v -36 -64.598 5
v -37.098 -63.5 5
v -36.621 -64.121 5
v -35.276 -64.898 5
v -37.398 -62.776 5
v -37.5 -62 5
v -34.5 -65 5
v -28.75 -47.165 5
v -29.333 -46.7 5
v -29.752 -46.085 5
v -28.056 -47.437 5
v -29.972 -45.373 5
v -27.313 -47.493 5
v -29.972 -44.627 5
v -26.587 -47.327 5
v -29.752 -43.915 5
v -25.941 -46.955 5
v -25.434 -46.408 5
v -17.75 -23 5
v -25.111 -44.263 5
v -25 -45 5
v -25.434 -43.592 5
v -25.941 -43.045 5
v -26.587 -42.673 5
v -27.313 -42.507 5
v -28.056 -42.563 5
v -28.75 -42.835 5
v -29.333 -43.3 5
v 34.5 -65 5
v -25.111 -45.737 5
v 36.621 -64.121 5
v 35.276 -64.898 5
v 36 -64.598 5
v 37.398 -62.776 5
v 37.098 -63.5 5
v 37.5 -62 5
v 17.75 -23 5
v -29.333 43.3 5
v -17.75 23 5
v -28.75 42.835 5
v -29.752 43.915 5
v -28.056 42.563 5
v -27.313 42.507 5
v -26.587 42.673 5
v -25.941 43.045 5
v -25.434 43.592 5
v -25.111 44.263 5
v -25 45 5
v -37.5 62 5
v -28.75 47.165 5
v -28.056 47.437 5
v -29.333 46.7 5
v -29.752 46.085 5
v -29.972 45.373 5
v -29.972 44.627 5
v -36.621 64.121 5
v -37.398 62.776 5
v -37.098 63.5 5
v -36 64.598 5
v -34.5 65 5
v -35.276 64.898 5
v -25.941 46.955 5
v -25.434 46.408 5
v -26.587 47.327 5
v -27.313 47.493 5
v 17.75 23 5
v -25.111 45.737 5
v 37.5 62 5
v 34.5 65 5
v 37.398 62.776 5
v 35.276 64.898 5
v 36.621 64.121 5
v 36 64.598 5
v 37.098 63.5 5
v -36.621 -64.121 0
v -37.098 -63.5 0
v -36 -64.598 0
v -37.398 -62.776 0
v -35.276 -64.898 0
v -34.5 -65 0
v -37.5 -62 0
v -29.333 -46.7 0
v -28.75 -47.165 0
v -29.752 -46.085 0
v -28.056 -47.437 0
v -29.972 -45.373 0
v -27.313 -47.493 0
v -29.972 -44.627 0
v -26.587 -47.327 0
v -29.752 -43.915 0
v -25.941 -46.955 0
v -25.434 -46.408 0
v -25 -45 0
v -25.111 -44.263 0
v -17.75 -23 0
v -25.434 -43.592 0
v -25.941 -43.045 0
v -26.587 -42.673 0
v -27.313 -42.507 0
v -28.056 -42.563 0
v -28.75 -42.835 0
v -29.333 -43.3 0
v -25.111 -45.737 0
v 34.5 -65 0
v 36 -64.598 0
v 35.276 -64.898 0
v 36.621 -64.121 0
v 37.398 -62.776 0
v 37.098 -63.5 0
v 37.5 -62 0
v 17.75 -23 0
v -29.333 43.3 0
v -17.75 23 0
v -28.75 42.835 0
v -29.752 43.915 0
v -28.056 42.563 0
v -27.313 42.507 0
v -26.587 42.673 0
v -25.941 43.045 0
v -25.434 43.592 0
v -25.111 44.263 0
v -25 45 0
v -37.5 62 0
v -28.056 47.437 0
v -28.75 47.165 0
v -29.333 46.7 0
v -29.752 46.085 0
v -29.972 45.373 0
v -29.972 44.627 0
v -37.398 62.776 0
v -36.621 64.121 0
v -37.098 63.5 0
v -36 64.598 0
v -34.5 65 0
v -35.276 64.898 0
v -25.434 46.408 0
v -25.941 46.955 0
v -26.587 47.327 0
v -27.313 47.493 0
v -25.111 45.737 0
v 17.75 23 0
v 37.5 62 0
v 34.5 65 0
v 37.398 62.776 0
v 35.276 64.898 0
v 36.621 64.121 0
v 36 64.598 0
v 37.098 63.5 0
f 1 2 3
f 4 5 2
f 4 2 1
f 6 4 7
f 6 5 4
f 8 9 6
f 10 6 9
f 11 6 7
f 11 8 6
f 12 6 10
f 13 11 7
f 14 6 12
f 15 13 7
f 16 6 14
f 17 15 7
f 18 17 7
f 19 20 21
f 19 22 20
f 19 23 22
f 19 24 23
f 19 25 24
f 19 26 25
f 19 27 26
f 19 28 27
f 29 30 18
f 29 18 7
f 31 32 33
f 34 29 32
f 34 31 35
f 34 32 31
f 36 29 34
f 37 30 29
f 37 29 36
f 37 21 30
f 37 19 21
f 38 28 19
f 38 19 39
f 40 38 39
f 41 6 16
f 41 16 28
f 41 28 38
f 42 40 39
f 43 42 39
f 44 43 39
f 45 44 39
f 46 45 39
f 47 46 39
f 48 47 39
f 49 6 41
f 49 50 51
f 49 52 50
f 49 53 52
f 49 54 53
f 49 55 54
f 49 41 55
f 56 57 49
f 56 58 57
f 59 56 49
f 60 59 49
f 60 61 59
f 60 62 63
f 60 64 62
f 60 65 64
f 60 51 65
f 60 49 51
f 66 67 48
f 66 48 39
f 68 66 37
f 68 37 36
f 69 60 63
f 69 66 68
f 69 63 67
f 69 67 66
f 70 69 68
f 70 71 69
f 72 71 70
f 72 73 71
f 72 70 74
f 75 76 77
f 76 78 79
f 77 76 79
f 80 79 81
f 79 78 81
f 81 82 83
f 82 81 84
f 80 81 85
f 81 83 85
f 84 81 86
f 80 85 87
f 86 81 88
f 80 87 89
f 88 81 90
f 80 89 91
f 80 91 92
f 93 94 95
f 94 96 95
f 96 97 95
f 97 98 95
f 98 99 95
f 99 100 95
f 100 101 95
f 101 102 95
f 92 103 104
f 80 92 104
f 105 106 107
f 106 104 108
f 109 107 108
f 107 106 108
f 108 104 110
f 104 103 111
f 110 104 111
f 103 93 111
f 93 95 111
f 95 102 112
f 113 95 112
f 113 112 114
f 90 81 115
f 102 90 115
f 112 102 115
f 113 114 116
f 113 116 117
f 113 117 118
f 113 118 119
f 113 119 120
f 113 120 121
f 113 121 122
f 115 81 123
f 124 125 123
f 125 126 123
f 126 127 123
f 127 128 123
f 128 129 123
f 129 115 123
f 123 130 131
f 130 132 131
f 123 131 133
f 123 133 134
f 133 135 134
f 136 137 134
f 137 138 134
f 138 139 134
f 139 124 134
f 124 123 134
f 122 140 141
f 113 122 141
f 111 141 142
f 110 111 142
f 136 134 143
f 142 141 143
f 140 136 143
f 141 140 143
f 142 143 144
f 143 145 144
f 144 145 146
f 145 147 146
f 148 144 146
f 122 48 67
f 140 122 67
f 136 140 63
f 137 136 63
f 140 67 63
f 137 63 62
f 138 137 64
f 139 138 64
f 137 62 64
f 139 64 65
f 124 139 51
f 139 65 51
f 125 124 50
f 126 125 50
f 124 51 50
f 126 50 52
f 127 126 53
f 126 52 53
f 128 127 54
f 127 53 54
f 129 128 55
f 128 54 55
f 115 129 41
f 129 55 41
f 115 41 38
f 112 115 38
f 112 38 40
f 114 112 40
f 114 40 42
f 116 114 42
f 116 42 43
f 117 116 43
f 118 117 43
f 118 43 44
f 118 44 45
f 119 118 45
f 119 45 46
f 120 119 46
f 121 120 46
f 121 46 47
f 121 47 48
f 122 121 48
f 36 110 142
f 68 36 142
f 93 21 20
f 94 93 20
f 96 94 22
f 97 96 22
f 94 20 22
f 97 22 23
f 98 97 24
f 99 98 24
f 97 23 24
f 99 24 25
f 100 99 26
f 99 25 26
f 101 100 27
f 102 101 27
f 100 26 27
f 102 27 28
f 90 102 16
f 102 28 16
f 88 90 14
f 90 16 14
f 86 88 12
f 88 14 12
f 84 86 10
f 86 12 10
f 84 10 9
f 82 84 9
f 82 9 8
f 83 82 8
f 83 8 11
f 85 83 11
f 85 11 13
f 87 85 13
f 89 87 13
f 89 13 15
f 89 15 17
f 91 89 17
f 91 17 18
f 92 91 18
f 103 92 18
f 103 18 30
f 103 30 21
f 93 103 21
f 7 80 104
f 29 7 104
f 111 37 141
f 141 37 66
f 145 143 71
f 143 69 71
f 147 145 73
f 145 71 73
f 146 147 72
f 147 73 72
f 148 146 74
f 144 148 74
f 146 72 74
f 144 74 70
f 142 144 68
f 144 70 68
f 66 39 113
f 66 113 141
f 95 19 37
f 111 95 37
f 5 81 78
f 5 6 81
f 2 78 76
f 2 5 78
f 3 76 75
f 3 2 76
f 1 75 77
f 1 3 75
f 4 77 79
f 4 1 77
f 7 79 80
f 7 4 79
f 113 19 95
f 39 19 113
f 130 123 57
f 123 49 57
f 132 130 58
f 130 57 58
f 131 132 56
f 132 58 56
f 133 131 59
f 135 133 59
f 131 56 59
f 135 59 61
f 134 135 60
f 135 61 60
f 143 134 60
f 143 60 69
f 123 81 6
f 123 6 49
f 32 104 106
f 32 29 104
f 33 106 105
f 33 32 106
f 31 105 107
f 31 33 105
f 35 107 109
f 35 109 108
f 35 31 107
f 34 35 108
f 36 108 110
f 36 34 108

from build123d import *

# Parameters (mm, degrees)
SKETCH_1_W          = 75
SKETCH_1_H          = 130
EXTRUDE_1_DEPTH     = 5
SKETCH_2_W          = 35.5
SKETCH_2_H          = 46
SKETCH_2_R          = 2.5
CUT_EXTRUDE_1_DEPTH = 10
FILLET_1_R          = 3


with BuildPart() as part:
    # 草图1 → 凸台-拉伸1 (new body)
    with BuildSketch(Plane.XY):
        Rectangle(SKETCH_1_W, SKETCH_1_H)
    extrude(amount=EXTRUDE_1_DEPTH)

    # 草图2 → 切除-拉伸1 (cut)
    with BuildSketch(Plane.XY.offset(5)):
        Rectangle(SKETCH_2_W, SKETCH_2_H)
        with Locations((-27.5, -45)):
            Circle(SKETCH_2_R)
        with Locations((-27.5, 45)):
            Circle(SKETCH_2_R)
    extrude(amount=-CUT_EXTRUDE_1_DEPTH, mode=Mode.SUBTRACT)

    # 圆角1
    fillet_1_edges = [part.edges().sort_by_distance(p)[0] for p in [
        (37.5, -65, 2.5),
        (-37.5, -65, 2.5),
        (-37.5, 65, 2.5),
        (37.5, 65, 2.5),
    ]]
    fillet(fillet_1_edges, radius=FILLET_1_R)


solid = part.part
